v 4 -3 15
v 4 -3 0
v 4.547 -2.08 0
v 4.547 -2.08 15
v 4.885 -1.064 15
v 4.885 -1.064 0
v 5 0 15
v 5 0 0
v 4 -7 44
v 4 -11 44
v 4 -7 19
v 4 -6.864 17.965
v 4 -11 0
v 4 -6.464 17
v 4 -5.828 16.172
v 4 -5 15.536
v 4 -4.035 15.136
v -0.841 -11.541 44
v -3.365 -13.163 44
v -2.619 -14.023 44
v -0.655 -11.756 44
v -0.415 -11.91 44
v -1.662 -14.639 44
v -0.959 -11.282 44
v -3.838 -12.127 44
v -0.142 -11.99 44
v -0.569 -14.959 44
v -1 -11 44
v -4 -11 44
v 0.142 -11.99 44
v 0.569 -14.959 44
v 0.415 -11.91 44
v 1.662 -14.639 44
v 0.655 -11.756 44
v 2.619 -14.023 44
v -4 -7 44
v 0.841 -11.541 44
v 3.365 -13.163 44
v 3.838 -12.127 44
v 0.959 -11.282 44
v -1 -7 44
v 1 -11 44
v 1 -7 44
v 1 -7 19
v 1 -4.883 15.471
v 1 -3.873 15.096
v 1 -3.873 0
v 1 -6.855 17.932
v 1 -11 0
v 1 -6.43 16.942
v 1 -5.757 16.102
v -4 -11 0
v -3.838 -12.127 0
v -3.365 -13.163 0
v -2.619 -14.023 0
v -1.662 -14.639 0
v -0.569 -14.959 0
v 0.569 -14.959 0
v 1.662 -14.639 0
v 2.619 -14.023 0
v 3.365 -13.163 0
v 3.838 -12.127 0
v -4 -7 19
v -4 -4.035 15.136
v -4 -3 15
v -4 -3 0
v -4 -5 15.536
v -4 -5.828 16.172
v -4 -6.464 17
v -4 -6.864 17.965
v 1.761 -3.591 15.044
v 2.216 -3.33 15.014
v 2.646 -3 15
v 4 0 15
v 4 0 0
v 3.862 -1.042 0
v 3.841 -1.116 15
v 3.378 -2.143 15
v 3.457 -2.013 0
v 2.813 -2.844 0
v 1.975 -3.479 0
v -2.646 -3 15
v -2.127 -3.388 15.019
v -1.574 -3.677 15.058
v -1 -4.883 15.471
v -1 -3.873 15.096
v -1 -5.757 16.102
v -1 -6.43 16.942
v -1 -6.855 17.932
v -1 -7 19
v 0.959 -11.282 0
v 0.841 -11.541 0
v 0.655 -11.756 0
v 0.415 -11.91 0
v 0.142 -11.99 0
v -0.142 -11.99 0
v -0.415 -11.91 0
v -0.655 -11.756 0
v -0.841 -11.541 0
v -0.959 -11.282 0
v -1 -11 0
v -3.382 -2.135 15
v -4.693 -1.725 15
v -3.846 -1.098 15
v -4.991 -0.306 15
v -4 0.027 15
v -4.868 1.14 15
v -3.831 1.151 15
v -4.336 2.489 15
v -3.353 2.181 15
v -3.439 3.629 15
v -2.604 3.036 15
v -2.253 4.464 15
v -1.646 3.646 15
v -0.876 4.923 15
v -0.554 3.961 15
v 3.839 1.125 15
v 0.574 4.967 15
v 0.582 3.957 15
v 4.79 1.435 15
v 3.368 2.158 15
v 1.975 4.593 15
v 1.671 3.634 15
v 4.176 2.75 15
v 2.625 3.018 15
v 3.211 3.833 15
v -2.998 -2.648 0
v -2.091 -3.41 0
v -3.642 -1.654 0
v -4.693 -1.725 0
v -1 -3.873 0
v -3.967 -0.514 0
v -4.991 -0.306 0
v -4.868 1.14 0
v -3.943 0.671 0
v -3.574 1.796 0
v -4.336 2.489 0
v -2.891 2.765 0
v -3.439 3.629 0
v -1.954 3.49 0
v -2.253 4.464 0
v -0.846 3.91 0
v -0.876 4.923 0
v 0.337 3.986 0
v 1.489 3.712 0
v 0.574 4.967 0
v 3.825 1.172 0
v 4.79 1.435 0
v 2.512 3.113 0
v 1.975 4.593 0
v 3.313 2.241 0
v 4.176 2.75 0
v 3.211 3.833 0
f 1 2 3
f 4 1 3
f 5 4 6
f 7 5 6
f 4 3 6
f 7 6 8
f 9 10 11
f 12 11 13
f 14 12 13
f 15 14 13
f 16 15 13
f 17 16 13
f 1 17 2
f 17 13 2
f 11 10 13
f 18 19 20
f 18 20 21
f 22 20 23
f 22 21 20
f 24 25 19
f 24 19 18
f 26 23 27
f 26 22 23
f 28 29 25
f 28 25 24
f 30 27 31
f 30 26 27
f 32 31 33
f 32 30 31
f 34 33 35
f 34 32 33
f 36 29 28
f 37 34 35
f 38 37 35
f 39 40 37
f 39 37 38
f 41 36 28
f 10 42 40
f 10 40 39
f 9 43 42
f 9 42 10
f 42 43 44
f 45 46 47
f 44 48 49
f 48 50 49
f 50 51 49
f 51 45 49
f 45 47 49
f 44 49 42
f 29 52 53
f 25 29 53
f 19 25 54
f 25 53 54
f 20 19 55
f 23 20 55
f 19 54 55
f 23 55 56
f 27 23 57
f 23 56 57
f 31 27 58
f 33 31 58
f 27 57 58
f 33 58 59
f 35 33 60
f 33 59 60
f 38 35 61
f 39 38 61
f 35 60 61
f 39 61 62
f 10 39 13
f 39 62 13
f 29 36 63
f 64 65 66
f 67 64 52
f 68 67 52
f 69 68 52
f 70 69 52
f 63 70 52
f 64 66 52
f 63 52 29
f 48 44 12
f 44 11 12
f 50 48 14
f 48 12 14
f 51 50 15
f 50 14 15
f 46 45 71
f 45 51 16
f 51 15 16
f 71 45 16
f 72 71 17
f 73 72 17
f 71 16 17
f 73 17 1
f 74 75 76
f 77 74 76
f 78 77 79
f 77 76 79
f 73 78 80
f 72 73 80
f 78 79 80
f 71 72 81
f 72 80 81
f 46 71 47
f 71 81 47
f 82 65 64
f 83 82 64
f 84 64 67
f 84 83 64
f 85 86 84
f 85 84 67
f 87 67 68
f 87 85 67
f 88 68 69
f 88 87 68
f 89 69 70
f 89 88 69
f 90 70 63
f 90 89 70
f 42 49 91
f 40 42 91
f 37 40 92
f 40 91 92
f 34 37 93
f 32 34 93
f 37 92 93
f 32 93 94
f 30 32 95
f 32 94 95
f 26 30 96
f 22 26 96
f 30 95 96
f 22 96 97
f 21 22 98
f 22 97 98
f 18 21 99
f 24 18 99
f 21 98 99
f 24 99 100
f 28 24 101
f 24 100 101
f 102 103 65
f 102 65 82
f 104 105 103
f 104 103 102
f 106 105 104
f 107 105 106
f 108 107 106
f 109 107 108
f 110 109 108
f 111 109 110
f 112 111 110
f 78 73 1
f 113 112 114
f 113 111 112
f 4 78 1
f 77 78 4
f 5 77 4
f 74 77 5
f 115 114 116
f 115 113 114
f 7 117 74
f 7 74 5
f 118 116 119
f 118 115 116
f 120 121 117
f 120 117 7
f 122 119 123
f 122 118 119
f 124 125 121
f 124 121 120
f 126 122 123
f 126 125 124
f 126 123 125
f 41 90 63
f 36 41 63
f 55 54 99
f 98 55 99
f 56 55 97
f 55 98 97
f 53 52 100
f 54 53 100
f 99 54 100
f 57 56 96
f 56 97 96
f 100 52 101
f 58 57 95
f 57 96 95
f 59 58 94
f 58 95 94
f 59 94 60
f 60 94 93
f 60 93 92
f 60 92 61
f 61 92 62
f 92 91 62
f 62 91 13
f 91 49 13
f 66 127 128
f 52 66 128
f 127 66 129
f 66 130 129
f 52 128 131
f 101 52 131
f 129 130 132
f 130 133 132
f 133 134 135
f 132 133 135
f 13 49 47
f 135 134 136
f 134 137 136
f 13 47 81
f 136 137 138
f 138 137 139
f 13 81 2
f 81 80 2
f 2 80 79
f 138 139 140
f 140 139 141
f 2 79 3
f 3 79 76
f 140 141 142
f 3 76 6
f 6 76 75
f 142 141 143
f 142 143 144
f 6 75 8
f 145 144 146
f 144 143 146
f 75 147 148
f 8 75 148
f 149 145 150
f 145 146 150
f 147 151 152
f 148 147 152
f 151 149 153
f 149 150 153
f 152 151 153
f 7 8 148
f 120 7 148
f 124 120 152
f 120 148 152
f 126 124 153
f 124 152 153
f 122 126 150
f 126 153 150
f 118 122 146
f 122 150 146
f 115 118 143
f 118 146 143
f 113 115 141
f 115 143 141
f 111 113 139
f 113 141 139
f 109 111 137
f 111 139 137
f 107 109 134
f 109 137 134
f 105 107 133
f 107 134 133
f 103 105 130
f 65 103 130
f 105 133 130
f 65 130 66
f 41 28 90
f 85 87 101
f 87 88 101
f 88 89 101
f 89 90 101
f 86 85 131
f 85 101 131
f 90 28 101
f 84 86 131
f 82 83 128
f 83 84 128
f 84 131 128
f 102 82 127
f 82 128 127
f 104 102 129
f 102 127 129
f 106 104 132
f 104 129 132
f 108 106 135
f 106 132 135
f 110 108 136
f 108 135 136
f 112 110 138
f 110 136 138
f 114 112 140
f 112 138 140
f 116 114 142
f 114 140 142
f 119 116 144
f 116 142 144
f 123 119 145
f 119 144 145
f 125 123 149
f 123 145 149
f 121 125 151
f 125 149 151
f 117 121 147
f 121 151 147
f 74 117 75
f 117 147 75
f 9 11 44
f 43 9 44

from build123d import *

# Parameters (mm, degrees)
F1_DEPTH = 15
F2_DEPTH = 15
F3_DEPTH = 44
F4_R     = 4


with BuildPart() as f1:
    # F0 (on Top) → F1 (new body)
    with BuildSketch(Plane.XY):
        with BuildLine():
            ThreePointArc((4, -3), (4.7434164903, -1.5811388301), (5, 0))
            ThreePointArc((5, 0), (-1.5811388301, 4.7434164903), (-4, -3))
            ThreePointArc((-4, -3), (-2.6742346142, -4.2247448714), (-1, -4.8989794856))
            Line((-1, -4.8989794856), (-1, -3.8729833462))
            ThreePointArc((-1, -3.8729833462), (-2.4494897428, 3.1622776602), (4, 0))
            ThreePointArc((4, 0), (3.1622776602, -2.4494897428), (1, -3.8729833462))
            Line((1, -3.8729833462), (1, -4.8989794856))
            ThreePointArc((1, -4.8989794856), (2.6742346142, -4.2247448714), (4, -3))
        make_face()
    extrude(amount=F1_DEPTH)

    # F0 (on Top) → F2 (join)
    with BuildSketch(Plane.XY):
        with BuildLine():
            Line((-1, -7), (-4, -7))
            Line((-4, -7), (-4, -11))
            ThreePointArc((-4, -11), (-3.1622776602, -8.5505102572), (-1, -7.1270166538))
            Line((-1, -7.1270166538), (-1, -7))
        make_face()
        with BuildLine():
            Line((4, -11), (4, -7))
            Line((4, -7), (1, -7))
            Line((1, -7), (1, -7.1270166538))
            ThreePointArc((1, -7.1270166538), (3.1622776602, -8.5505102572), (4, -11))
        make_face()
        with BuildLine():
            ThreePointArc((-1, -7.1270166538), (-3.1622776602, -8.5505102572), (-4, -11))
            ThreePointArc((-4, -11), (0, -15), (4, -11))
            ThreePointArc((4, -11), (3.1622776602, -8.5505102572), (1, -7.1270166538))
            Line((1, -7.1270166538), (1, -11))
            ThreePointArc((1, -11), (0, -12), (-1, -11))
            Line((-1, -11), (-1, -7.1270166538))
        make_face()
        with BuildLine():
            ThreePointArc((-1, -4.8989794856), (-2.6742346142, -4.2247448714), (-4, -3))
            Line((-4, -3), (-4, -7))
            Line((-4, -7), (-1, -7))
            Line((-1, -7), (-1, -4.8989794856))
        make_face()
        with BuildLine():
            Line((4, -7), (4, -3))
            ThreePointArc((4, -3), (2.6742346142, -4.2247448714), (1, -4.8989794856))
            Line((1, -4.8989794856), (1, -7))
            Line((1, -7), (4, -7))
        make_face()
    extrude(amount=F2_DEPTH)

    # F0 (on Top) → F3 (join)
    with BuildSketch(Plane.XY):
        with BuildLine():
            ThreePointArc((-1, -7.1270166538), (-3.1622776602, -8.5505102572), (-4, -11))
            ThreePointArc((-4, -11), (0, -15), (4, -11))
            ThreePointArc((4, -11), (3.1622776602, -8.5505102572), (1, -7.1270166538))
            Line((1, -7.1270166538), (1, -11))
            ThreePointArc((1, -11), (0, -12), (-1, -11))
            Line((-1, -11), (-1, -7.1270166538))
        make_face()
        with BuildLine():
            Line((-1, -7), (-4, -7))
            Line((-4, -7), (-4, -11))
            ThreePointArc((-4, -11), (-3.1622776602, -8.5505102572), (-1, -7.1270166538))
            Line((-1, -7.1270166538), (-1, -7))
        make_face()
        with BuildLine():
            Line((4, -11), (4, -7))
            Line((4, -7), (1, -7))
            Line((1, -7), (1, -7.1270166538))
            ThreePointArc((1, -7.1270166538), (3.1622776602, -8.5505102572), (4, -11))
        make_face()
    extrude(amount=F3_DEPTH)

    # F4
    f4_edges = [f1.edges().sort_by_distance(p)[0] for p in [
        (-2.5, -7, 15),
        (2.5, -7, 15),
    ]]
    fillet(f4_edges, radius=F4_R)


solid = f1.part
